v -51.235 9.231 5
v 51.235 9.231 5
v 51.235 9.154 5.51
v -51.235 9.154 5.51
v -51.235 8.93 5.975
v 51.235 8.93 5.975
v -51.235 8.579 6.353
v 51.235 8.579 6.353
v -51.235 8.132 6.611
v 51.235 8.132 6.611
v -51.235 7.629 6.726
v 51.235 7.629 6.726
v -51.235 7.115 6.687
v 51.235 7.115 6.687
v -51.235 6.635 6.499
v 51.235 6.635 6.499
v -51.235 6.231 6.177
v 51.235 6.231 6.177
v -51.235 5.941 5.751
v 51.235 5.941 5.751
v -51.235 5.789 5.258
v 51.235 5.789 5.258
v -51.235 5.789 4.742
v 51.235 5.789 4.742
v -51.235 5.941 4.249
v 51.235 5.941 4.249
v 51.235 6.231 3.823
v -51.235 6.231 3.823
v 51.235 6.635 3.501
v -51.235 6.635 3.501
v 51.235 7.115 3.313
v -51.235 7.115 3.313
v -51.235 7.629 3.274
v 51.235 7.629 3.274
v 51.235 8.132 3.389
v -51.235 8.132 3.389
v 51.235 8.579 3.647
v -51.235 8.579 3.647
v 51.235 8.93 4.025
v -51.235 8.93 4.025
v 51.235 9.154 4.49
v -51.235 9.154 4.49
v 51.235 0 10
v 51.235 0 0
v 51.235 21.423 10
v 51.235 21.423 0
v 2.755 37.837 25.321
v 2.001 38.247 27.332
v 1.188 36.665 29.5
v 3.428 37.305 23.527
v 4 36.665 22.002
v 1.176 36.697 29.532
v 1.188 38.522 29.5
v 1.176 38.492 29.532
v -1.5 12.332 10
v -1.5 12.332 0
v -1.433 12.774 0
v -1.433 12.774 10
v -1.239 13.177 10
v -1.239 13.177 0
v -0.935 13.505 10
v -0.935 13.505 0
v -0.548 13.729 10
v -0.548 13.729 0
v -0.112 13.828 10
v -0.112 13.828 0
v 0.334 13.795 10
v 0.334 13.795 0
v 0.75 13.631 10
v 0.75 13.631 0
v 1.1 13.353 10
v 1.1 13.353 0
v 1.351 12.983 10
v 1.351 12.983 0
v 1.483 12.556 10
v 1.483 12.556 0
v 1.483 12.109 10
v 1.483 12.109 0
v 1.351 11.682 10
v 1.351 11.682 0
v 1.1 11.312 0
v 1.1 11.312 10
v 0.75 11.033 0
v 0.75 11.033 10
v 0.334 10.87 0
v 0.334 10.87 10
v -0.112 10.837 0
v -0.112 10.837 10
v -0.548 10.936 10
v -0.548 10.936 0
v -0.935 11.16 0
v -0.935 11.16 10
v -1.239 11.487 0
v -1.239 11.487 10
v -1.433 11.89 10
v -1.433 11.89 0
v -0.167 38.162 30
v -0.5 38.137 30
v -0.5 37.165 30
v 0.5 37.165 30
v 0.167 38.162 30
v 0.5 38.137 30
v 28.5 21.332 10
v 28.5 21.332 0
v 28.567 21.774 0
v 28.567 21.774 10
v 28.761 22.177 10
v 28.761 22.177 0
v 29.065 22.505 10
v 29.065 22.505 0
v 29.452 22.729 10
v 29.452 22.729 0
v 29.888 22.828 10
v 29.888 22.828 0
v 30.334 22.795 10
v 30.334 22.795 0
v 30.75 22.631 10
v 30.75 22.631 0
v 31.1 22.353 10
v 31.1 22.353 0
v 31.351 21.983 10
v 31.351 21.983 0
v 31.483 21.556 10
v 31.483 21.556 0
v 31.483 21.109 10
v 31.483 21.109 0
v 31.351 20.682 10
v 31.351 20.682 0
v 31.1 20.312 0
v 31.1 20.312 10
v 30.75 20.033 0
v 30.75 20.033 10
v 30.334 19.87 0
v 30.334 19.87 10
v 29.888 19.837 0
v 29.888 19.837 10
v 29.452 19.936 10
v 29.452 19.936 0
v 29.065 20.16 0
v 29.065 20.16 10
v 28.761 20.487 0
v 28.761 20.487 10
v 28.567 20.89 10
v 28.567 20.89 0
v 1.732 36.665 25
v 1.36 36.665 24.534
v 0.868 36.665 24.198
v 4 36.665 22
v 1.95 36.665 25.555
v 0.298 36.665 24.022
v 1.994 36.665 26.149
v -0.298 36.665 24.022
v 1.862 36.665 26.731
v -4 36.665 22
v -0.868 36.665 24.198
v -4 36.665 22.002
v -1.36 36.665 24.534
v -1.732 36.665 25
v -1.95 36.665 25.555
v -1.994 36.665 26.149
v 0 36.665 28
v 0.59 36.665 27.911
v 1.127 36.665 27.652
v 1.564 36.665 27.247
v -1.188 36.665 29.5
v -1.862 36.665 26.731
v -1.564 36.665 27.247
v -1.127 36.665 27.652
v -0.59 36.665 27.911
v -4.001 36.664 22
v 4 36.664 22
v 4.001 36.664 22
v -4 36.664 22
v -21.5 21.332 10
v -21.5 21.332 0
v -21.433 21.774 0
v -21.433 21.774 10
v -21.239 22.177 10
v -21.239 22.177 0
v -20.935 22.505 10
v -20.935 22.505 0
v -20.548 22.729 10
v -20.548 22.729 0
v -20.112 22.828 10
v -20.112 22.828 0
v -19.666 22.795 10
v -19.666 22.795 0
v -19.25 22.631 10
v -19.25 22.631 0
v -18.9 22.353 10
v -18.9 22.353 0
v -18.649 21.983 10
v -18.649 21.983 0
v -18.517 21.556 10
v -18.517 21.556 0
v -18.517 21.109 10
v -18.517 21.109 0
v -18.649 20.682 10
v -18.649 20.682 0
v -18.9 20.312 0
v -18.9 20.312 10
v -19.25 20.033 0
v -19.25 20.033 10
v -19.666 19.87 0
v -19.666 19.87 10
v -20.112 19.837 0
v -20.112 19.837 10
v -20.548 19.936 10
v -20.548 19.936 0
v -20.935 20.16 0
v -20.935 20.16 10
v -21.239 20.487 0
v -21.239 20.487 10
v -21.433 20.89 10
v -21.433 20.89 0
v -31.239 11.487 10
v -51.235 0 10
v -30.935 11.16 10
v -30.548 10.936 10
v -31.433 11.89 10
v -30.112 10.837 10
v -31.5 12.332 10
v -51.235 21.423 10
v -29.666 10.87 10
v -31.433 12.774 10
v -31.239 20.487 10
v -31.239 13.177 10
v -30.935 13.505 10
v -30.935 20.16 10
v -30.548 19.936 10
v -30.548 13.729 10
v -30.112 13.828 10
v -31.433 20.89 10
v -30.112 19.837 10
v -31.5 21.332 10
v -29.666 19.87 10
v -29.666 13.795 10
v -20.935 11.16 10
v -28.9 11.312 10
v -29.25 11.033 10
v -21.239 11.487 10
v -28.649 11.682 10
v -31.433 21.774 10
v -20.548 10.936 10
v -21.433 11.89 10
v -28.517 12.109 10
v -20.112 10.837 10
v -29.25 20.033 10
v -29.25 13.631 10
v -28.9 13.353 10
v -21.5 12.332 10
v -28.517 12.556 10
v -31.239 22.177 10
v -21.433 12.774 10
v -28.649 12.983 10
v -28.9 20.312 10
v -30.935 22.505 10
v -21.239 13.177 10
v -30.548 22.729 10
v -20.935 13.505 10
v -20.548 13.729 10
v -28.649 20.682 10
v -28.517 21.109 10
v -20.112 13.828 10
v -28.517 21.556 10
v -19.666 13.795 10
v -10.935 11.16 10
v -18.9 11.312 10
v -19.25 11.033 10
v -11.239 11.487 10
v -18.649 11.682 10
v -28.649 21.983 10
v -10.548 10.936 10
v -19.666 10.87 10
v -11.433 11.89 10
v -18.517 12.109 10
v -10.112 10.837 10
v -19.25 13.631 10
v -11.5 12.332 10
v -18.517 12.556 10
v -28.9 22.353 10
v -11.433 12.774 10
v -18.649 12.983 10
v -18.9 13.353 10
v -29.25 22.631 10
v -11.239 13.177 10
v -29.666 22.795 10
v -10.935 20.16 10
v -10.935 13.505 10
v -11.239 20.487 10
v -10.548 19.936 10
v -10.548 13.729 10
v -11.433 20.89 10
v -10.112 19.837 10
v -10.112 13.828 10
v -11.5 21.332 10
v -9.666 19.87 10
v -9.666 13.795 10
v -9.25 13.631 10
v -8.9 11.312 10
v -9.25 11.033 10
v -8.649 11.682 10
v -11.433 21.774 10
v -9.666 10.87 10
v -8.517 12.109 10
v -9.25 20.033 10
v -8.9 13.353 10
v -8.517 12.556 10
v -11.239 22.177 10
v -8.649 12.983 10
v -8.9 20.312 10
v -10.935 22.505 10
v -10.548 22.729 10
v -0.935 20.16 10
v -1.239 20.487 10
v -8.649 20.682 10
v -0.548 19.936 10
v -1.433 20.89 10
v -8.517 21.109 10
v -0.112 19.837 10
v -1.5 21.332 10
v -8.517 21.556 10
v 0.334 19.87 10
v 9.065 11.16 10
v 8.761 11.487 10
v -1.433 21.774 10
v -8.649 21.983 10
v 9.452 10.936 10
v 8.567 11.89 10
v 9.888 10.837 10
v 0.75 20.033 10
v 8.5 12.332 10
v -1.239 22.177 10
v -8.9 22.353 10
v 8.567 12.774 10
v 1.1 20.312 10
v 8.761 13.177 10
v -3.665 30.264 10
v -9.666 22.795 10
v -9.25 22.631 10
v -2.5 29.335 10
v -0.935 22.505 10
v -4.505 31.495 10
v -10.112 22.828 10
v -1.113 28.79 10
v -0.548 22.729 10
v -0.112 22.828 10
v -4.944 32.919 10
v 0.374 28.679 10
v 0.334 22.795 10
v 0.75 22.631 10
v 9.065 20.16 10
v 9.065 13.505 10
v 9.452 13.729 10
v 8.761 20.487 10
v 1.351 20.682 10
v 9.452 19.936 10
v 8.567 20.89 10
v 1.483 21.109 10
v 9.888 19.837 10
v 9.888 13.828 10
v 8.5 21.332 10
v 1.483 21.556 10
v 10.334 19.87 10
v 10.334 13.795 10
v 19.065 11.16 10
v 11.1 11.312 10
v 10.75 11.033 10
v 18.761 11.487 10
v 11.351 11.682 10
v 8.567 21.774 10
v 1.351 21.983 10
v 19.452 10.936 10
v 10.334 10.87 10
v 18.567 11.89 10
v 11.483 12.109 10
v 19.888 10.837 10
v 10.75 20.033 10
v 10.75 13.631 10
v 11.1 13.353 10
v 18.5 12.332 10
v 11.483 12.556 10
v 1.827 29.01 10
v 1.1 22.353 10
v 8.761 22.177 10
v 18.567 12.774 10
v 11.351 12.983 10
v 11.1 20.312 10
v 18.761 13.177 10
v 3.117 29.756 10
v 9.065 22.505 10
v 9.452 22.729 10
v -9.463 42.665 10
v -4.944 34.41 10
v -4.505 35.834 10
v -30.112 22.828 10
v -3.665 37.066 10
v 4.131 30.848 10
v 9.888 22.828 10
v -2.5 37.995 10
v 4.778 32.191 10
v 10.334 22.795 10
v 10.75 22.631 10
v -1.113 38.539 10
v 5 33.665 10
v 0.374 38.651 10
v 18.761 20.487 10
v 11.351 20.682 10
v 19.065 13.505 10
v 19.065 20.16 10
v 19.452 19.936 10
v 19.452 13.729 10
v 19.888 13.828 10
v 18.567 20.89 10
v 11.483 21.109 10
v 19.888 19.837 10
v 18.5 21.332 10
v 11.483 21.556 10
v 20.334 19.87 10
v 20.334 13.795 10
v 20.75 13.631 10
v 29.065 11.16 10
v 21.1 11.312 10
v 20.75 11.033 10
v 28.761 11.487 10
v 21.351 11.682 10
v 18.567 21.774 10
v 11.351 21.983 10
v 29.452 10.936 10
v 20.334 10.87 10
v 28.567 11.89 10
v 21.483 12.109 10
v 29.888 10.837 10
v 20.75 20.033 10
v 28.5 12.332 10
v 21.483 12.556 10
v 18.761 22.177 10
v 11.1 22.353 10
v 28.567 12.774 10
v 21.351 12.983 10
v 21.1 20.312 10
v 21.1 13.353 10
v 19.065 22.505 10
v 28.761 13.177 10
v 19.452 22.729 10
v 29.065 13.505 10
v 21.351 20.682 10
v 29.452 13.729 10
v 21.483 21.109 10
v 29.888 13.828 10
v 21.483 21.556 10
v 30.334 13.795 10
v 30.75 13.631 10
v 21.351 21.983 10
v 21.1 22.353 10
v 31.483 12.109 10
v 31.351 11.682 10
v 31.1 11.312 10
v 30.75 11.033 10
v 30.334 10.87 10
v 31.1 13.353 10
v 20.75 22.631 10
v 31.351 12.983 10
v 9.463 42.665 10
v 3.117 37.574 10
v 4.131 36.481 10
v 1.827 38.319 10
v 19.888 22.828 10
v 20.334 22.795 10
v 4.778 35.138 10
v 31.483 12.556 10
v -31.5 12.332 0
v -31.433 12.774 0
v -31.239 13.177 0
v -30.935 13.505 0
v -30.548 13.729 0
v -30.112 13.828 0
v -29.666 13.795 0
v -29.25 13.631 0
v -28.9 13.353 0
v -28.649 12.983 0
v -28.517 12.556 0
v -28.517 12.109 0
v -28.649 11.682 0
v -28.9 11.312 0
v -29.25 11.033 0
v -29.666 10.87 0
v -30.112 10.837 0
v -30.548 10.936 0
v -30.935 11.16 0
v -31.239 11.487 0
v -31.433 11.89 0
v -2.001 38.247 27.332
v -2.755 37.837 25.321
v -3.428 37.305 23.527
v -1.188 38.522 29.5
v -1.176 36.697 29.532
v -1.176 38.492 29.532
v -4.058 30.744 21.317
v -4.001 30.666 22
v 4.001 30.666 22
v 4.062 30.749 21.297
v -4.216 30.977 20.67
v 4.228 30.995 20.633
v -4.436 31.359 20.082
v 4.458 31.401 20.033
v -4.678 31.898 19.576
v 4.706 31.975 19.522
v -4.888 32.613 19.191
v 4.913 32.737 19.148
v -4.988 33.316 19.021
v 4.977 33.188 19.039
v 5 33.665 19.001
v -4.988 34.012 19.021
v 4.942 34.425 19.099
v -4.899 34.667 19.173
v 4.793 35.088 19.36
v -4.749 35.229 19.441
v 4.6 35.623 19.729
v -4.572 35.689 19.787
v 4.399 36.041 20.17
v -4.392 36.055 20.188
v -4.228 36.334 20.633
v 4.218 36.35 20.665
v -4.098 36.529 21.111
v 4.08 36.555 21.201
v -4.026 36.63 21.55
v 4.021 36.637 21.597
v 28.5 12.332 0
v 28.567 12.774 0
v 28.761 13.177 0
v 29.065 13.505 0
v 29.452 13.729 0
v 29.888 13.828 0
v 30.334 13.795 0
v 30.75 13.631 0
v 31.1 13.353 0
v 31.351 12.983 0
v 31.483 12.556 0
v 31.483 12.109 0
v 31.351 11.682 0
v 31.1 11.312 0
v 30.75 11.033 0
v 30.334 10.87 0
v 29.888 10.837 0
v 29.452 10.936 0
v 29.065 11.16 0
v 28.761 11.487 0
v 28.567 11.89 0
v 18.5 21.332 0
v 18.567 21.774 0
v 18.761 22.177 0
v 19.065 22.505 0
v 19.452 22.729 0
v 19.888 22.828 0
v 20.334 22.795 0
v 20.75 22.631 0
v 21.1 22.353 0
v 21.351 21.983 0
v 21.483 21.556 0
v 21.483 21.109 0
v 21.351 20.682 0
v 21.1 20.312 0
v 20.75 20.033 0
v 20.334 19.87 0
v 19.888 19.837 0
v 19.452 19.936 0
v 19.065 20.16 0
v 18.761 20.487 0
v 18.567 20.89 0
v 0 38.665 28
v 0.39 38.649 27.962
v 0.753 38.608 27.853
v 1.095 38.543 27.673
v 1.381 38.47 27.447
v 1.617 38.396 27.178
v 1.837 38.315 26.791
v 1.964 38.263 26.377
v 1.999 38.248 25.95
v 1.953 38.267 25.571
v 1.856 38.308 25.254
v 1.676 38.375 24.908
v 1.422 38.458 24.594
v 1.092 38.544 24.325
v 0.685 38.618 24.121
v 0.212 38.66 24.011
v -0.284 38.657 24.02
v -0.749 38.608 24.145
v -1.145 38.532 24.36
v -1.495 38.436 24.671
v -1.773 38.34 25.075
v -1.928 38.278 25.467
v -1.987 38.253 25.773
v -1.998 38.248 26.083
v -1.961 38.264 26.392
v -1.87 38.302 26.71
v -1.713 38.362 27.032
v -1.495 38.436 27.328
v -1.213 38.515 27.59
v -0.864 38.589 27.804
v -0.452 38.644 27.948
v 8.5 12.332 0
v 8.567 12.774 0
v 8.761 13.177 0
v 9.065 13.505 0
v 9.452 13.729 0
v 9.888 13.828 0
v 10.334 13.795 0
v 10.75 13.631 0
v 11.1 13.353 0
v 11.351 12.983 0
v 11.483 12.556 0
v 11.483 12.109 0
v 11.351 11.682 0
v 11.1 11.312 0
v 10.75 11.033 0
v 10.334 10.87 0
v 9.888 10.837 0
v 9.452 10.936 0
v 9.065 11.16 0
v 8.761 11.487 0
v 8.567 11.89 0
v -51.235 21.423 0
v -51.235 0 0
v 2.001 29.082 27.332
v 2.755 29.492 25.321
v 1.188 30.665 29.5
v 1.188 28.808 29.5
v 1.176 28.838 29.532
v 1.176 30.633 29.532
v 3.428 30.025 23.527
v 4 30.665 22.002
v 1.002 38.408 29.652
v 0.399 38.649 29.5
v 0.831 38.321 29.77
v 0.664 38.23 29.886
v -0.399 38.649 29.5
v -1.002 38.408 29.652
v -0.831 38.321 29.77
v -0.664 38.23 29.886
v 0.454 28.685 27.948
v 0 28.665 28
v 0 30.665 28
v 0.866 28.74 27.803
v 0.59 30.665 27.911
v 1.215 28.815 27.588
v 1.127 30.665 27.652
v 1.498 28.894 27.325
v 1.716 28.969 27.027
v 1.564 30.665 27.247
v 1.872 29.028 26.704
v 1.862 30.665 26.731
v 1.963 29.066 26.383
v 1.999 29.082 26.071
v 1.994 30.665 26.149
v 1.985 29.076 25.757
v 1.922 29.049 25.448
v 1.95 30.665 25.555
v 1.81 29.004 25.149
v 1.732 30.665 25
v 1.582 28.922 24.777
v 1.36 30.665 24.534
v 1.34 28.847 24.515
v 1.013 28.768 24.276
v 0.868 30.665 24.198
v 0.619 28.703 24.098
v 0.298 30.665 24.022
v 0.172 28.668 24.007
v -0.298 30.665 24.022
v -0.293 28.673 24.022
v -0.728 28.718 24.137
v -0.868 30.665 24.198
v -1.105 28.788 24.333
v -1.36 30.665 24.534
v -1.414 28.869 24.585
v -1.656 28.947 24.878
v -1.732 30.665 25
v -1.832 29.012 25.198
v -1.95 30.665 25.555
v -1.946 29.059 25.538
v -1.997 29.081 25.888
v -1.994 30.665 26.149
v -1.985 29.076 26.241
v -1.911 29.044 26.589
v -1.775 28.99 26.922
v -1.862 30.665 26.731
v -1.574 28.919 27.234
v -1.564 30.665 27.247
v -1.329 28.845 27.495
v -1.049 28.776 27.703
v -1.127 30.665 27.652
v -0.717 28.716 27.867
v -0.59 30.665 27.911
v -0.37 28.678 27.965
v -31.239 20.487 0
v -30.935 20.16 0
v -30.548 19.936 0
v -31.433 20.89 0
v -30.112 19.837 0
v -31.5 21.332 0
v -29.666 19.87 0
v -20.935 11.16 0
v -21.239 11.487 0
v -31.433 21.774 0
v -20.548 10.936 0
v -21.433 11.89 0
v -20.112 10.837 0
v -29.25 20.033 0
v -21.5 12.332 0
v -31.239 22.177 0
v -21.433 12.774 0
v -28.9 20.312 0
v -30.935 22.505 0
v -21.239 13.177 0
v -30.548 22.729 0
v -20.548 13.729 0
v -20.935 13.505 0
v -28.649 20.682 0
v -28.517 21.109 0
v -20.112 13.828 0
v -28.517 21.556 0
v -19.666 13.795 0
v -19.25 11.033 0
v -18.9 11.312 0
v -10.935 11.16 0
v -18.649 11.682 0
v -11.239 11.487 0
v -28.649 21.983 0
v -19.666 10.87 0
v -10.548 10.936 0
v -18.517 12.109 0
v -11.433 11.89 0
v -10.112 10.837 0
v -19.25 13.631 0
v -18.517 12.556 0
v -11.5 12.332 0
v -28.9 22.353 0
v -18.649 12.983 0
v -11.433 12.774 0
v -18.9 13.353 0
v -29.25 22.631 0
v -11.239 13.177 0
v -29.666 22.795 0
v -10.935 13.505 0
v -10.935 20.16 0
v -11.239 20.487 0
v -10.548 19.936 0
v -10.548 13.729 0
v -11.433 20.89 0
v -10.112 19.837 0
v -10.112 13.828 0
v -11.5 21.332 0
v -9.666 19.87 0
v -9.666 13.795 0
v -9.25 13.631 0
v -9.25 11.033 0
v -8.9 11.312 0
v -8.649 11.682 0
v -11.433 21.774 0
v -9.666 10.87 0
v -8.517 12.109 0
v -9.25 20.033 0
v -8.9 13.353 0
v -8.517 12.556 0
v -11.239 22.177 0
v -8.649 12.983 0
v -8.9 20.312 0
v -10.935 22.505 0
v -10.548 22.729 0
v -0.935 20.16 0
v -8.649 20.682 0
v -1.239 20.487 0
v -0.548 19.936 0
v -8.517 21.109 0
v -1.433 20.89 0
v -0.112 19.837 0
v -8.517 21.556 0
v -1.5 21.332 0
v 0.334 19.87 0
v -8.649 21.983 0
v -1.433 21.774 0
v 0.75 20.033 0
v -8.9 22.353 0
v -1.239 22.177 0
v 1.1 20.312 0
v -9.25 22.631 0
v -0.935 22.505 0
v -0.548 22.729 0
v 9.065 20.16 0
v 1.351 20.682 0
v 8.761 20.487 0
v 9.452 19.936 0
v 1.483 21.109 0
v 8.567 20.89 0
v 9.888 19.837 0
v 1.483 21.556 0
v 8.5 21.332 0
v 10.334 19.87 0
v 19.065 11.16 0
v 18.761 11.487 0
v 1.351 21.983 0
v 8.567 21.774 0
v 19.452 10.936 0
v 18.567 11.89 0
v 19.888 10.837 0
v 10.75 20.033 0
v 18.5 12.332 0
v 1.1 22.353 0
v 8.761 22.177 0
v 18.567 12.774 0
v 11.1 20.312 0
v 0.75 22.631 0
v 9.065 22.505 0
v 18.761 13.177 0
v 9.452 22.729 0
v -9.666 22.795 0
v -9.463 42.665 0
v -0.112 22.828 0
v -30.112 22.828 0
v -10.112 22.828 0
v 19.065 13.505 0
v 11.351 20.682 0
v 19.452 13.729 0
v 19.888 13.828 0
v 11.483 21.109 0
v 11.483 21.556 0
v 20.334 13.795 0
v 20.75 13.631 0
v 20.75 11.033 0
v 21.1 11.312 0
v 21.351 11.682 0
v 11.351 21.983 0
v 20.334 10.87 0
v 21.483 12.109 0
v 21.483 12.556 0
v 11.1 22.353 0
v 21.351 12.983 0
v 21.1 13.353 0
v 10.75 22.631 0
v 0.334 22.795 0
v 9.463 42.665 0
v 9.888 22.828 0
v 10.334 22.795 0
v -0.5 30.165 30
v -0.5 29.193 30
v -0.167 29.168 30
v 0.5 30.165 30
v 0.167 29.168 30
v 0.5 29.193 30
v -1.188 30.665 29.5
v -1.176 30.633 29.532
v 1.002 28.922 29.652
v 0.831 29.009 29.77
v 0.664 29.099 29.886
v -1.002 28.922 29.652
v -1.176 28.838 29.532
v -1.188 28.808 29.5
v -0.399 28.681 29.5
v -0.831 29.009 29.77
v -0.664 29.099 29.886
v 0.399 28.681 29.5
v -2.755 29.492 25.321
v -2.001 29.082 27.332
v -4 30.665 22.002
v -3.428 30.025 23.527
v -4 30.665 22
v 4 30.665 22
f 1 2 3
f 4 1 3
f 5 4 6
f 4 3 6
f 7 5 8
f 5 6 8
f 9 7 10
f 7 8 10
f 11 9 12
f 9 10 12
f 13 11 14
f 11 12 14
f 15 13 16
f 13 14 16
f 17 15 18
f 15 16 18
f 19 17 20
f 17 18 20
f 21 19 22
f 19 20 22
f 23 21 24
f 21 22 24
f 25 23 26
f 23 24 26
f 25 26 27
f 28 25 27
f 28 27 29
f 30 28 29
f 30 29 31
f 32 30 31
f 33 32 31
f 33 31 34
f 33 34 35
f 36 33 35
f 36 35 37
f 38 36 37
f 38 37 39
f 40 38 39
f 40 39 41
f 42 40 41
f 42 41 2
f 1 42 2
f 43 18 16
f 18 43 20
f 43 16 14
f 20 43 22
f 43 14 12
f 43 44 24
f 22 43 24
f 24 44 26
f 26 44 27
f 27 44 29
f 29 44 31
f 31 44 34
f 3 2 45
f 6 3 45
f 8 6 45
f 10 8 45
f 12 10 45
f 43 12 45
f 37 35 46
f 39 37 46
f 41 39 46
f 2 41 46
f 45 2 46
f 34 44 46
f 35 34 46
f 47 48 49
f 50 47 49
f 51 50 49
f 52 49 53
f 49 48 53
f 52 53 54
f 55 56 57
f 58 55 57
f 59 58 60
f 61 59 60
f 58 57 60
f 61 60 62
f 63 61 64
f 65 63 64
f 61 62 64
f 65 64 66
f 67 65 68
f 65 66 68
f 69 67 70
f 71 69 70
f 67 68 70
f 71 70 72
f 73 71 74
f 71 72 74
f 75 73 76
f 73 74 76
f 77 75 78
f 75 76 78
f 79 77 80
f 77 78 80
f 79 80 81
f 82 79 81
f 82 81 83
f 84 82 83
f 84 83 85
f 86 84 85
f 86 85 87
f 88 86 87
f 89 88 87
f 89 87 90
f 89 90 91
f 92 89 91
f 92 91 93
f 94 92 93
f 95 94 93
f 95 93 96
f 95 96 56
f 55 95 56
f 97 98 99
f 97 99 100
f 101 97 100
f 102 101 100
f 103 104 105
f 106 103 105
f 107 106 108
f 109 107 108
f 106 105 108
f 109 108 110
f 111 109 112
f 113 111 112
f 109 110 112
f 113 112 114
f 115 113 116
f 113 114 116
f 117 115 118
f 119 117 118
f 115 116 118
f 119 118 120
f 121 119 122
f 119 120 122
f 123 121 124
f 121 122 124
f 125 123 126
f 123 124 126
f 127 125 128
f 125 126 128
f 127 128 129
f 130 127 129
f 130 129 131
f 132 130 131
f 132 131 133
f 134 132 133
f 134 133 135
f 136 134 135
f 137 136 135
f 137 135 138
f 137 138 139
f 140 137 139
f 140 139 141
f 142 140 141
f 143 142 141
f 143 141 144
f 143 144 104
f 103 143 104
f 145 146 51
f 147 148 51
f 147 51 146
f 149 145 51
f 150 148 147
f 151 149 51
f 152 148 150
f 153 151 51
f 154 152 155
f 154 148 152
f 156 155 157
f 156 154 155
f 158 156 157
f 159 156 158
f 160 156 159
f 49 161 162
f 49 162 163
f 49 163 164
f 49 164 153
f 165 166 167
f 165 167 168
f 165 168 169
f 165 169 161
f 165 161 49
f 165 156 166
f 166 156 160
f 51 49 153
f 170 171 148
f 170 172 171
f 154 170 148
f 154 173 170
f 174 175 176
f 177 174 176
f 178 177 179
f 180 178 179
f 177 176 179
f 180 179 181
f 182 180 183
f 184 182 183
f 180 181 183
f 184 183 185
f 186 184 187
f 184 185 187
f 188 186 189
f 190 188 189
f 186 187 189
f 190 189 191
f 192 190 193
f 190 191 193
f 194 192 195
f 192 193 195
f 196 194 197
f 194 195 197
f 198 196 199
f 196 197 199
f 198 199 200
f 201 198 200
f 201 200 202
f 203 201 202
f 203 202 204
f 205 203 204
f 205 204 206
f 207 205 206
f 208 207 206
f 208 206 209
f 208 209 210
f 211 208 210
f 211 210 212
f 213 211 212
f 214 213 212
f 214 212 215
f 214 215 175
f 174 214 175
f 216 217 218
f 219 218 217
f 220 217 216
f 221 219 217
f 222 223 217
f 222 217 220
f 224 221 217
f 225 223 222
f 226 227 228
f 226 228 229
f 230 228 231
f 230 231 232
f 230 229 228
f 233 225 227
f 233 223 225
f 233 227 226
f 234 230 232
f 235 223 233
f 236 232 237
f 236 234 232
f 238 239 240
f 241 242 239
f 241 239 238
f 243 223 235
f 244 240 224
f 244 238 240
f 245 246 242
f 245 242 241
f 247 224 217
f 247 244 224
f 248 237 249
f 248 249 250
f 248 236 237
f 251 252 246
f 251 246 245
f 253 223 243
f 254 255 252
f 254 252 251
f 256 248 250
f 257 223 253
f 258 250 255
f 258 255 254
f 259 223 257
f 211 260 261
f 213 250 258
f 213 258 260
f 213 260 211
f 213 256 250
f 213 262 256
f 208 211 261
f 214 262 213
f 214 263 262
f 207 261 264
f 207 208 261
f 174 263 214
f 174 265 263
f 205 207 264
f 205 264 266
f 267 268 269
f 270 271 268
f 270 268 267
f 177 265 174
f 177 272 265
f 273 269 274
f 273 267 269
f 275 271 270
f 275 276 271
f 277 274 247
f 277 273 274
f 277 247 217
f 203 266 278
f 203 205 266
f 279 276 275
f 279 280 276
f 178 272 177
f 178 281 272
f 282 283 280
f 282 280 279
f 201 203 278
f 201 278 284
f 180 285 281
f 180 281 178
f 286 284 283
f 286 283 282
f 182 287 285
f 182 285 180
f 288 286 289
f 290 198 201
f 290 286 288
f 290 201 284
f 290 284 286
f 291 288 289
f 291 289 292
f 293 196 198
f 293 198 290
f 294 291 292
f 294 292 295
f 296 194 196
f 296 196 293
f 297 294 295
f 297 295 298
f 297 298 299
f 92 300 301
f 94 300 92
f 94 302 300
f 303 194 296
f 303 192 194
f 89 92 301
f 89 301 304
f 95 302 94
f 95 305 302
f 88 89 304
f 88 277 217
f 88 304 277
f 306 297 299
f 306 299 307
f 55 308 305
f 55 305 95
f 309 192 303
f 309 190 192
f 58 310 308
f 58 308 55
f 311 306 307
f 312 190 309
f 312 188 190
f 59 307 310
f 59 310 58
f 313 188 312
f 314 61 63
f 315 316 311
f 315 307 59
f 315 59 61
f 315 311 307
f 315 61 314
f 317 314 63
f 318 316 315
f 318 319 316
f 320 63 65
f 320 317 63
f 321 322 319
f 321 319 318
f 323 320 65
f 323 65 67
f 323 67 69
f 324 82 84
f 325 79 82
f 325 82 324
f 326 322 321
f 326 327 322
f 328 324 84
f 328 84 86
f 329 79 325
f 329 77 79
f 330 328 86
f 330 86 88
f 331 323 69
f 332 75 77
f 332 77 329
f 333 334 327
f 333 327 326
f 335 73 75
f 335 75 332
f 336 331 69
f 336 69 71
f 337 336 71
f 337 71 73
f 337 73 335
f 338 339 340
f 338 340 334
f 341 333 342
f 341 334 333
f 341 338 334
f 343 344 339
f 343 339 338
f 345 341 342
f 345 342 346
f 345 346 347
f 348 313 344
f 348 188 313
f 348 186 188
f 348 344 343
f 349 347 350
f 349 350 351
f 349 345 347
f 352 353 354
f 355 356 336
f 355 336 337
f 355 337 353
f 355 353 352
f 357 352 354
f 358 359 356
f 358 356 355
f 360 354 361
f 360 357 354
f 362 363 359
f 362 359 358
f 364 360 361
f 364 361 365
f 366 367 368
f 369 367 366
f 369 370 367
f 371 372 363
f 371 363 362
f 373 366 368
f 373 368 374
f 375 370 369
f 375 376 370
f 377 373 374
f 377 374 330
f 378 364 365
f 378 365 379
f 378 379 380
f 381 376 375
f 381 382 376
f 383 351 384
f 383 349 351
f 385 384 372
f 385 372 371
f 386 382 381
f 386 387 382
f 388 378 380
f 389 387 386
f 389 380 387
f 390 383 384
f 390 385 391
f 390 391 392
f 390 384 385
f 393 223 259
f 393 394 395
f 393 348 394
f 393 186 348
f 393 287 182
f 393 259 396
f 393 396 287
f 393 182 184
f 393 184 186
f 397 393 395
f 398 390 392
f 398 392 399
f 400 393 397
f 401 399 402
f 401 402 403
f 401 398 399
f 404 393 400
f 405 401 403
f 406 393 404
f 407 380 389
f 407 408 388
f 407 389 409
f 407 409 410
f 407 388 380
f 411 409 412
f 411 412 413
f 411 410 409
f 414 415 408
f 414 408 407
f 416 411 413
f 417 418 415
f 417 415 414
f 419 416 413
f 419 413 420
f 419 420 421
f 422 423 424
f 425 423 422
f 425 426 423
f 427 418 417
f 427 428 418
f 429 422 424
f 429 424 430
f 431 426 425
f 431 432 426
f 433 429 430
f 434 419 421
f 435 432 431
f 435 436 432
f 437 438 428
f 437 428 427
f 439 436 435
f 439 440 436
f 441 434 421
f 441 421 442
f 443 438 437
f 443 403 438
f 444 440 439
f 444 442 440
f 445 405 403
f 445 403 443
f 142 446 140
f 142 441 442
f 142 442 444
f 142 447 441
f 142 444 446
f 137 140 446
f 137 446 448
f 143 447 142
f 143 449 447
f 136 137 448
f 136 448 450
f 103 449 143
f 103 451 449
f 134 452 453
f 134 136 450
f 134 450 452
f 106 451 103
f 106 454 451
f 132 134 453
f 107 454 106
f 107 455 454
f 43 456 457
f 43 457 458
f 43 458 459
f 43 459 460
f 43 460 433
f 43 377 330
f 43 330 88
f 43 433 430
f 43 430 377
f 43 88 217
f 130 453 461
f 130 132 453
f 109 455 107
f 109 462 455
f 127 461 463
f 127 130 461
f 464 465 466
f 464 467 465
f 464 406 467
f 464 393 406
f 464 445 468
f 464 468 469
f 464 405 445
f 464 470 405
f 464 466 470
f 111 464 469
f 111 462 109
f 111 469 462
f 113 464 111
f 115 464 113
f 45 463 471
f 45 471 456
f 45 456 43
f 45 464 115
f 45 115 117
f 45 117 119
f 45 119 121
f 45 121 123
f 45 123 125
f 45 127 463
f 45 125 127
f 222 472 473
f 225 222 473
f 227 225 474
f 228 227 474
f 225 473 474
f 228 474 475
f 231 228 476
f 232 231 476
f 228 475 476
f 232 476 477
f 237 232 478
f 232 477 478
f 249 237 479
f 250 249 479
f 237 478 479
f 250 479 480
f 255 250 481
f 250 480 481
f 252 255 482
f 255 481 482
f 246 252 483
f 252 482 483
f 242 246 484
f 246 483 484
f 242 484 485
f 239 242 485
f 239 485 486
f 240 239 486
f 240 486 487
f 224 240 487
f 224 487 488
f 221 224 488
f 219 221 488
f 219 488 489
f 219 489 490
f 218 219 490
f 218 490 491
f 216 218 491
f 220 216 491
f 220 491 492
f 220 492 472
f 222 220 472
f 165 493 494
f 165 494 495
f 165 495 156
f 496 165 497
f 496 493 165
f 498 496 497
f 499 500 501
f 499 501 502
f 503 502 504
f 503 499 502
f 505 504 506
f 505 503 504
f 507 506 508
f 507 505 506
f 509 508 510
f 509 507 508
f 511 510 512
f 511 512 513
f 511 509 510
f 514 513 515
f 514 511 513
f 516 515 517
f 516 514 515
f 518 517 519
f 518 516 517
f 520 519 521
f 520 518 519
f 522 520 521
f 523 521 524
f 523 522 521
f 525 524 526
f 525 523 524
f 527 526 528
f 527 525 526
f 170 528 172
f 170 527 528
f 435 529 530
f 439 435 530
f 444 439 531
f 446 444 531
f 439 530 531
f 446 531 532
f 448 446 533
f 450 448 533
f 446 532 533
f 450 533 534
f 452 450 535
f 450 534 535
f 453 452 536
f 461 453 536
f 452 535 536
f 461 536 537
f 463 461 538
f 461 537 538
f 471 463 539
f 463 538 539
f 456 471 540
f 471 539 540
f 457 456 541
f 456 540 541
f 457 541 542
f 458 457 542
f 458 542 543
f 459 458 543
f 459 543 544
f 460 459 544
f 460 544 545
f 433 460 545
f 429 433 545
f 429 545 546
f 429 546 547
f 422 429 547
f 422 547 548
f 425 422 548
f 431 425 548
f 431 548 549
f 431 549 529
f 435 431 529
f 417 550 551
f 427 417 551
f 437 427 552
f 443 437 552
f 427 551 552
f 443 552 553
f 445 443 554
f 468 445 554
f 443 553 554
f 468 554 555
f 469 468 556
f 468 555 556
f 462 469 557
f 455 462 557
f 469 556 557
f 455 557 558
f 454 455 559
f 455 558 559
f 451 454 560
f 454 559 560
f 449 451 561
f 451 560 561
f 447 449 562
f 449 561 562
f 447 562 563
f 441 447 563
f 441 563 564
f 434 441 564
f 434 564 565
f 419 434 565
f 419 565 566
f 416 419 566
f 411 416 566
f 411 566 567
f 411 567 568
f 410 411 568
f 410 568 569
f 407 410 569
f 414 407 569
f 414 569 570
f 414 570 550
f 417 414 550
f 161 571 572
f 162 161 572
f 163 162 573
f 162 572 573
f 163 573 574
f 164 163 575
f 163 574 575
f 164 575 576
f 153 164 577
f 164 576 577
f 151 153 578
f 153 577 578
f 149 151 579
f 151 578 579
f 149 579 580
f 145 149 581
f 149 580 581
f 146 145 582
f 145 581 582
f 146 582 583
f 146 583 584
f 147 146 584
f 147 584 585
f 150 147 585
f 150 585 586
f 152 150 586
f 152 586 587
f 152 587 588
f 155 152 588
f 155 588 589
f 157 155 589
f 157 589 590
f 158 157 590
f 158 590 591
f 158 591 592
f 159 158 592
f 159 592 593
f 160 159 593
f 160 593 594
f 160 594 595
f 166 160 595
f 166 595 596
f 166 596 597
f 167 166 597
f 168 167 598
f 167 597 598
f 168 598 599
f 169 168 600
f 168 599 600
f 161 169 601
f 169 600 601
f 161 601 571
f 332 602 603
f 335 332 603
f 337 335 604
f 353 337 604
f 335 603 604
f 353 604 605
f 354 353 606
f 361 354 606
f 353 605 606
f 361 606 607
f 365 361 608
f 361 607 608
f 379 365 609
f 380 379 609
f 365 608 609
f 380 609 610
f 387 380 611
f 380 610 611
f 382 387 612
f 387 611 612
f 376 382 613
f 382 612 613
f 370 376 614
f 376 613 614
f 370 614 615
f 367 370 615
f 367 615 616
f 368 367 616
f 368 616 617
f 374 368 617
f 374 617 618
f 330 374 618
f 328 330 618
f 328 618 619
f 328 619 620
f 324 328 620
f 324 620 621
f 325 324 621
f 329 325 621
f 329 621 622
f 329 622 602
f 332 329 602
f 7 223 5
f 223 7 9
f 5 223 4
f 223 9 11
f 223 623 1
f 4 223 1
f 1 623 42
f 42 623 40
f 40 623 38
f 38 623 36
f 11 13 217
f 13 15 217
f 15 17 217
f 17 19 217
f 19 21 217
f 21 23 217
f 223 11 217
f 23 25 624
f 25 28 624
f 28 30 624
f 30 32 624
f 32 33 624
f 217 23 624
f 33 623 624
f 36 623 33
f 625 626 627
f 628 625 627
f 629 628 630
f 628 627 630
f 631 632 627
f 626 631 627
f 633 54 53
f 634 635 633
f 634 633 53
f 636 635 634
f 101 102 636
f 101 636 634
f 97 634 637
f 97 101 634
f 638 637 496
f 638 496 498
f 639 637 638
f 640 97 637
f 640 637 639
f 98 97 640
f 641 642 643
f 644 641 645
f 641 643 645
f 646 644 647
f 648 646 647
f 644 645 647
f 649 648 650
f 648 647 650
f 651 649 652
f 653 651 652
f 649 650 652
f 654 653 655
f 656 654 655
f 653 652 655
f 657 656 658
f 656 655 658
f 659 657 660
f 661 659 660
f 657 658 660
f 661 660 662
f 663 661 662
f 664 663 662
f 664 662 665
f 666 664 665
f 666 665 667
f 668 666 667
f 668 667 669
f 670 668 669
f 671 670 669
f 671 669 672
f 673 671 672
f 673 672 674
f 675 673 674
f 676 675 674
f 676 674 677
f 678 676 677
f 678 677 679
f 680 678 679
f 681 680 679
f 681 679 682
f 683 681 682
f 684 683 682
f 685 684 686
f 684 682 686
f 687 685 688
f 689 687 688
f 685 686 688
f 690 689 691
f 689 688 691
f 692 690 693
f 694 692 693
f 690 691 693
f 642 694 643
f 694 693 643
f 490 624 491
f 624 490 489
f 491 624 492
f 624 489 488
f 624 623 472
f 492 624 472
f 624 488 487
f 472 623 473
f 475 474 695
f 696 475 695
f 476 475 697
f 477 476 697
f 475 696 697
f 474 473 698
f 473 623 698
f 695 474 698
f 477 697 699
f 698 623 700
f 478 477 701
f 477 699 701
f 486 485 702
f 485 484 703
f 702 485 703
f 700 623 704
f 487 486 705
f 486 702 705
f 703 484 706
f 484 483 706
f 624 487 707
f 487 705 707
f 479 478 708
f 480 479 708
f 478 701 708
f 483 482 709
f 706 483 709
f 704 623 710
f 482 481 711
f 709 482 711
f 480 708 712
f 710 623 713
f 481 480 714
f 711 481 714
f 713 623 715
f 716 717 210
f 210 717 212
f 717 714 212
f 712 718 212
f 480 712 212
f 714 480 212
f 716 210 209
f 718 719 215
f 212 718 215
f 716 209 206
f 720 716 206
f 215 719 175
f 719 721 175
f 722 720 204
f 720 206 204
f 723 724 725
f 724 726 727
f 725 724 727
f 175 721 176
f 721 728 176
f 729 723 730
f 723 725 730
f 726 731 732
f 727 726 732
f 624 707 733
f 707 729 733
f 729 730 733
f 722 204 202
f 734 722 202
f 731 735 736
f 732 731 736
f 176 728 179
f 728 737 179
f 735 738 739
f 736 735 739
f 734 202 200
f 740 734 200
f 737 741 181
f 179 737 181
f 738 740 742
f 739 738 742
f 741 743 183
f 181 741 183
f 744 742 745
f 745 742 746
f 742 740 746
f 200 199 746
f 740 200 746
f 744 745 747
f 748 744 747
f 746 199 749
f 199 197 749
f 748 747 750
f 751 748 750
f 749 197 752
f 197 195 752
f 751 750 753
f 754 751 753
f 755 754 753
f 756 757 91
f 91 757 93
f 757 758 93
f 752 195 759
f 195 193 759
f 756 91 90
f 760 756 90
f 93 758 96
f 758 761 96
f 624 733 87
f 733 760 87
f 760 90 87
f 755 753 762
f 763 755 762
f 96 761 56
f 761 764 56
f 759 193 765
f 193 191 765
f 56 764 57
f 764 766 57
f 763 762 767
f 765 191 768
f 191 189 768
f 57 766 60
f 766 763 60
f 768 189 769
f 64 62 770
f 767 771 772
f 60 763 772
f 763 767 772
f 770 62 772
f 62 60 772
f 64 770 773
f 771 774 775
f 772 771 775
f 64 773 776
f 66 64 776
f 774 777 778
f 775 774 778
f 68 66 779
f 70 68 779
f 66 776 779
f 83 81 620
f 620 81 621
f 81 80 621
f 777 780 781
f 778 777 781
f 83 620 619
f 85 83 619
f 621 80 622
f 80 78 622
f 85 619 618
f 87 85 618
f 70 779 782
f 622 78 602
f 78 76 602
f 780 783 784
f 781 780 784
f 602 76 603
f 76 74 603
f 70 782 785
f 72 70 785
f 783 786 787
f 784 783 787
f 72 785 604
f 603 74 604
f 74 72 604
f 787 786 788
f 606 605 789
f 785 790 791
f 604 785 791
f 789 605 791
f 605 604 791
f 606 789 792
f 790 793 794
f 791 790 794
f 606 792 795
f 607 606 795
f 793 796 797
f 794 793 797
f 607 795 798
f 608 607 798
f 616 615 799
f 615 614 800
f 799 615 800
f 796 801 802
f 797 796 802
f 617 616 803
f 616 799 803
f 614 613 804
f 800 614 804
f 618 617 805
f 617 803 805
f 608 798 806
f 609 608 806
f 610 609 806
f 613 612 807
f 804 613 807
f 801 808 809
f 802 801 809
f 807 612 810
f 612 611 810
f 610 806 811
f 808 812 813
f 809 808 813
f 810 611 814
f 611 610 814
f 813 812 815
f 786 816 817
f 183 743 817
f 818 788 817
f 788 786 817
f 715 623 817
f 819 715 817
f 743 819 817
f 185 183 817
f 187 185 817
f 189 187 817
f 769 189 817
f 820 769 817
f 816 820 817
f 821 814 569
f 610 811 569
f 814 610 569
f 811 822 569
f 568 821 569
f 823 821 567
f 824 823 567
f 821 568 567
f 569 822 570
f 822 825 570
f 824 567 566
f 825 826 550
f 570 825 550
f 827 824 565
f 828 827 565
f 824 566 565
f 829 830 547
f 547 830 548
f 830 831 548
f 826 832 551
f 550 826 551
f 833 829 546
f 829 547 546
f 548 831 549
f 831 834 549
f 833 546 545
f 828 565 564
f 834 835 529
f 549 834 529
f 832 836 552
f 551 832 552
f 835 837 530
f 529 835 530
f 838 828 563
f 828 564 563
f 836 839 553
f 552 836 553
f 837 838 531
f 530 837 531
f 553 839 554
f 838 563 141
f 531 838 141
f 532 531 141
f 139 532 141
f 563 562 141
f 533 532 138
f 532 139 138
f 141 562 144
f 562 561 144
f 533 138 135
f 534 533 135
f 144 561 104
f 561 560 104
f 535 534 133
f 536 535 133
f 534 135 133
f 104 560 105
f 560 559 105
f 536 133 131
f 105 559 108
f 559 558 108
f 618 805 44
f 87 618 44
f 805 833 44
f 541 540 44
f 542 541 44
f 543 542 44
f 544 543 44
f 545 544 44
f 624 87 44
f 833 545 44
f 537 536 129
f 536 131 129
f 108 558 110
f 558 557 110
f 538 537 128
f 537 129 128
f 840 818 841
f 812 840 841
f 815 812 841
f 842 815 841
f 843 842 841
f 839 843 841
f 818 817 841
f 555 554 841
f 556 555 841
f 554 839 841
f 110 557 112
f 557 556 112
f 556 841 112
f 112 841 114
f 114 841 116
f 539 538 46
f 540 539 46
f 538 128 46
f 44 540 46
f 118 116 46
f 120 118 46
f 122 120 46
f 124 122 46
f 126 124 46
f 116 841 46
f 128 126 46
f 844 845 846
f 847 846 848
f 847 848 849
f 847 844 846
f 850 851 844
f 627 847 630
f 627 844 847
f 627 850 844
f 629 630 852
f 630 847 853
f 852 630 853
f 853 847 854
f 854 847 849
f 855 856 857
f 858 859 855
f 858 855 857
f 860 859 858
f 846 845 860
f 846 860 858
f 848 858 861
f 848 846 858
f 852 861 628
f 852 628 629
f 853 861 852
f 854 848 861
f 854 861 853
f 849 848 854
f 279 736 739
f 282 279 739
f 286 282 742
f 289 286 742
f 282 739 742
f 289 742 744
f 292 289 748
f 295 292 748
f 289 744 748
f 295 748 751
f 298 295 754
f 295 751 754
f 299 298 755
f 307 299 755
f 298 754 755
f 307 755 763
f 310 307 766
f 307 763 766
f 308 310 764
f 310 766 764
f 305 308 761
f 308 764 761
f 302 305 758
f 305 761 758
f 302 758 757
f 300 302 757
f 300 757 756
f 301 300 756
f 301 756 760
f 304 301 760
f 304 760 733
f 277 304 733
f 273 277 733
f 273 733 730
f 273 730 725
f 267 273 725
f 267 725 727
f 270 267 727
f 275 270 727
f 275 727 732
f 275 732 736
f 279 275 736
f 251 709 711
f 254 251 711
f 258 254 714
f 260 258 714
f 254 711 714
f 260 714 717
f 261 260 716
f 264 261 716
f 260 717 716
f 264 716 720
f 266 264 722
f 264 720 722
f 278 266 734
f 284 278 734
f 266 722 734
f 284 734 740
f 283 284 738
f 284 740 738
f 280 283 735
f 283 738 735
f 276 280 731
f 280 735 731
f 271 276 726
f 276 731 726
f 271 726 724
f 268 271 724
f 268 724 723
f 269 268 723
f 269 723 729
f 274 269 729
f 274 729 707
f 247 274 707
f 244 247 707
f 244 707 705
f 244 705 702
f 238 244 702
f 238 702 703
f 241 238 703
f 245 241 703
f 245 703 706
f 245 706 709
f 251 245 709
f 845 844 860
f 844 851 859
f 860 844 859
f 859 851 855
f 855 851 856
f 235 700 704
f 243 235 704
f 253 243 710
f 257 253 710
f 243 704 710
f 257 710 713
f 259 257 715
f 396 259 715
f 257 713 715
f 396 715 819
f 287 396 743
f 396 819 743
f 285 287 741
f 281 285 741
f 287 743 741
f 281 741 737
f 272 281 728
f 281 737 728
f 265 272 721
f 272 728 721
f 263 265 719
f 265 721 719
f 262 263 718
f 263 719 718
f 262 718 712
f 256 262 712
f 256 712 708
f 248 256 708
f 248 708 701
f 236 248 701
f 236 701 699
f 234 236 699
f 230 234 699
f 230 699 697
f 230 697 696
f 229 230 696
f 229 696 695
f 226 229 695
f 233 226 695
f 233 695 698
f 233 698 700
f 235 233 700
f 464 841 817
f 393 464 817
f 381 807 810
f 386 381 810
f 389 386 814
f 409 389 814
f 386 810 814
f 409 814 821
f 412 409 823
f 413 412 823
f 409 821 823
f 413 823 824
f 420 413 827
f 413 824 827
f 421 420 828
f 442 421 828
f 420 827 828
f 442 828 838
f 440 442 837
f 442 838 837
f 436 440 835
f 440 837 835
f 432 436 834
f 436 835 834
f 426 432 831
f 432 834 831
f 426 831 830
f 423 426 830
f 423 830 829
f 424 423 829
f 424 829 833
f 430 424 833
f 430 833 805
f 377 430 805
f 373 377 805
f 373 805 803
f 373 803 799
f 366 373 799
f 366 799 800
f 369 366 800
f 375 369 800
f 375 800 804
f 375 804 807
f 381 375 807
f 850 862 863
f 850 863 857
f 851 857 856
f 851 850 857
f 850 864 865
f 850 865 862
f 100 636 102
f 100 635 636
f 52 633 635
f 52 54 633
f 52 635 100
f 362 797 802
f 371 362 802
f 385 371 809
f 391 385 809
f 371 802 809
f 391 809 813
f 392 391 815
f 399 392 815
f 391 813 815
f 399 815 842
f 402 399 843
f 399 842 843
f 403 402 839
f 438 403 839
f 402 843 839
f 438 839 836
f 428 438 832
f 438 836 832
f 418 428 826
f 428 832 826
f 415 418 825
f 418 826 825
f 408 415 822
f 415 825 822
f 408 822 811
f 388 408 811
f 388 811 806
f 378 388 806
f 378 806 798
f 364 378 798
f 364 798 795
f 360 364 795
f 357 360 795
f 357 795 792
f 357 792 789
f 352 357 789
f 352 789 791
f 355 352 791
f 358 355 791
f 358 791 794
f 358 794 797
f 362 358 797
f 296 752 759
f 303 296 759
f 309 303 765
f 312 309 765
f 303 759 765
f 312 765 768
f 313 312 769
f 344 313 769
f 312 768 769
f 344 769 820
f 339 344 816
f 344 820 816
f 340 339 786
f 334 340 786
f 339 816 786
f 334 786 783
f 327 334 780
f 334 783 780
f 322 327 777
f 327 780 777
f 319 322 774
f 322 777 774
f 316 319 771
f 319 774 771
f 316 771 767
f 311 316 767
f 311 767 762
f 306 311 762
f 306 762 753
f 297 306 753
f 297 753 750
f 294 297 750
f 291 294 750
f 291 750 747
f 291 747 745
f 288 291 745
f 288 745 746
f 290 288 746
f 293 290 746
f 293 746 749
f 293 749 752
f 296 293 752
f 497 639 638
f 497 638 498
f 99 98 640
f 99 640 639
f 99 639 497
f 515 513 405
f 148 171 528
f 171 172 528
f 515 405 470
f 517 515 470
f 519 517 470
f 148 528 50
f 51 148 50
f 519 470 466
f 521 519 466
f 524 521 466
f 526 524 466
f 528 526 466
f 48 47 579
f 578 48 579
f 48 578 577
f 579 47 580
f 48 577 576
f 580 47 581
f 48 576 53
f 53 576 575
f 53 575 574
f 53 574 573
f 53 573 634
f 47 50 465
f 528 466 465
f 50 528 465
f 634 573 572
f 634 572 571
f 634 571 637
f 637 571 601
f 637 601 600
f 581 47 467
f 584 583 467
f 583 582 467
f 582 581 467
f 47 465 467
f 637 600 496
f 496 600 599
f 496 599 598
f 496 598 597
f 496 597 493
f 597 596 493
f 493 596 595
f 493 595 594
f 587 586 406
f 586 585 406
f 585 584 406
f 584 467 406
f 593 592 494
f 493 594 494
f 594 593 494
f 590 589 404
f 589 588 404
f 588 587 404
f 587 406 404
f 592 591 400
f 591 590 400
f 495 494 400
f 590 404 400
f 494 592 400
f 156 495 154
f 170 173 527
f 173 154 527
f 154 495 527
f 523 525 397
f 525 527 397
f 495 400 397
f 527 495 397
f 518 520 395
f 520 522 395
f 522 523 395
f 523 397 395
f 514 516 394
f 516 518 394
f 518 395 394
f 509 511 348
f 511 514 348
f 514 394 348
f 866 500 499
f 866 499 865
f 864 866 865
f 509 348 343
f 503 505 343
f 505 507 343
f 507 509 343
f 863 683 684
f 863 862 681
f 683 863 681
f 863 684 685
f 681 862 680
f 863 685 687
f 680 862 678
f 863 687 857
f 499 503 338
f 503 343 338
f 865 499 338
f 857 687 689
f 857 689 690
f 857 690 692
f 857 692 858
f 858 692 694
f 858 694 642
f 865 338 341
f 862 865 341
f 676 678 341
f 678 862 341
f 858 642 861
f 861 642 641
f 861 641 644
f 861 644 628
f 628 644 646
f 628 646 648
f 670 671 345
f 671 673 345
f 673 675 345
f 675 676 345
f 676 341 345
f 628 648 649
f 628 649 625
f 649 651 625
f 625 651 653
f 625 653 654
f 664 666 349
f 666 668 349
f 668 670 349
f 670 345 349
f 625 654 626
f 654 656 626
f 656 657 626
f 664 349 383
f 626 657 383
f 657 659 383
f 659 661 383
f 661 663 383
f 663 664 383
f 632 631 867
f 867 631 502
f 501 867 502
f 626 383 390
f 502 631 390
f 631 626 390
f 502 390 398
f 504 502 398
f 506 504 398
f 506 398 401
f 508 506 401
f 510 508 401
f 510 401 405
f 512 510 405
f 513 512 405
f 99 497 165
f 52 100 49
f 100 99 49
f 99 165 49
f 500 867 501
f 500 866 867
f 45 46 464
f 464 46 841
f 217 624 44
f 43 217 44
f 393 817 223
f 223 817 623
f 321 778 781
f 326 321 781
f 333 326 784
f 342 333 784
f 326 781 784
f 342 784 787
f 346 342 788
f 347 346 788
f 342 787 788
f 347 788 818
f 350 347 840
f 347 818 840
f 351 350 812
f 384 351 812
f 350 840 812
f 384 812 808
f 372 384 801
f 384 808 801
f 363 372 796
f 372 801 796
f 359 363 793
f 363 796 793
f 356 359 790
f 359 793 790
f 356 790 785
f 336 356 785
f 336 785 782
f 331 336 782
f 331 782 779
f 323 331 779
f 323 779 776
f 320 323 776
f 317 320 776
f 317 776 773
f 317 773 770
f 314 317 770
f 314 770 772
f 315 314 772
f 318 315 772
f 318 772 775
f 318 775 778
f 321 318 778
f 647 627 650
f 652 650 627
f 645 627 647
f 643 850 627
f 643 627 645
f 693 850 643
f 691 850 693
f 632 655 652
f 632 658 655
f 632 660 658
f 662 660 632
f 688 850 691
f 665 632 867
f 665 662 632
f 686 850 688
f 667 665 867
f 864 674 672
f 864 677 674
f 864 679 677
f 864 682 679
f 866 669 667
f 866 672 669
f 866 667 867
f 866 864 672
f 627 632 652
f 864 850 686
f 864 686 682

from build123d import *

# Parameters (mm, degrees)
BOSS_EXTRUDE1_DEPTH = 10
SKETCH10_R          = 1.5
CUT_EXTRUDE9_DEPTH  = 20
SKETCH11_R          = 1.730599661
CUT_EXTRUDE10_DEPTH = 112.446287057
SKETCH12_R          = 5
BOSS_EXTRUDE4_DEPTH = 20
CUT_EXTRUDE11_START = -10.000002096
CUT_EXTRUDE11_DEPTH = 10.000002096
SKETCH14_R          = 2
CUT_EXTRUDE12_DEPTH = 71.851658179
CHAMFER1_SIZE       = 0.5


# Read off the part's stored shape, not the designer's step: Cut-Extrude11
with BuildPart() as part:
    # Sketch1 → Boss-Extrude1 (new body)
    with BuildSketch(Plane.XY):
        Polygon((51.23475383, 0), (51.23475383, 21.423100566), (9.462915873, 42.664679757), (-9.462915873, 42.664679757), (-51.23475383, 21.423100566), (-51.23475383, 0), align=None)
    extrude(amount=BOSS_EXTRUDE1_DEPTH)

    # Sketch10 → Cut-Extrude9 (cut)
    with BuildSketch(Plane(origin=(0, 0, 0), x_dir=(-1, 0, 0), z_dir=(0, 0, -1))):
        with Locations((0, 21.332339879)):
            Circle(SKETCH10_R)
        with Locations((10, 21.332339879)):
            Circle(SKETCH10_R)
        with Locations((20, 21.332339879)):
            Circle(SKETCH10_R)
        with Locations((30, 21.332339879)):
            Circle(SKETCH10_R)
        with Locations((-10, 21.332339879)):
            Circle(SKETCH10_R)
        with Locations((-20, 21.332339879)):
            Circle(SKETCH10_R)
        with Locations((-30, 21.332339879)):
            Circle(SKETCH10_R)
        with Locations((10, 12.332339879)):
            Circle(SKETCH10_R)
        with Locations((0, 12.332339879)):
            Circle(SKETCH10_R)
        with Locations((20, 12.332339879)):
            Circle(SKETCH10_R)
        with Locations((30, 12.332339879)):
            Circle(SKETCH10_R)
        with Locations((-10, 12.332339879)):
            Circle(SKETCH10_R)
        with Locations((-20, 12.332339879)):
            Circle(SKETCH10_R)
        with Locations((-30, 12.332339879)):
            Circle(SKETCH10_R)
    extrude(amount=-CUT_EXTRUDE9_DEPTH, mode=Mode.SUBTRACT)

    # Sketch11 → Cut-Extrude10 (cut, through all)
    with BuildSketch(Plane(origin=(51.23475383, 0, 0), x_dir=(0, 0, -1), z_dir=(1, 0, 0))):
        with Locations(Location((-5, 7.5, 0), (0, 0, 90))):
            Circle(SKETCH11_R)
    extrude(amount=-CUT_EXTRUDE10_DEPTH, mode=Mode.SUBTRACT)

    # Sketch12 → Boss-Extrude4 (add)
    with BuildSketch(Plane.XY.offset(10)):
        with Locations((0, 33.664679757)):
            Circle(SKETCH12_R)
    extrude(amount=BOSS_EXTRUDE4_DEPTH)

    # Cut-Extrude11 outline → Cut-Extrude11 (cut)
    with BuildSketch(Plane(origin=(5, 0, 0), x_dir=(0, 0, -1), z_dir=(1, 0, 0)).offset(CUT_EXTRUDE11_START)):
        with BuildLine():
            ThreePointArc((-22, 30.665551075), (-19.000871318, 33.664679757), (-22, 36.663808439))
            Line((-22, 36.663808439), (-22, 36.664679757))
            Line((-22, 36.664679757), (-30, 36.664679757))
            Line((-30, 36.664679757), (-30, 30.664679757))
            Line((-30, 30.664679757), (-22, 30.664679757))
            Line((-22, 30.664679757), (-22, 30.665551075))
        make_face()
    extrude(amount=CUT_EXTRUDE11_DEPTH, mode=Mode.SUBTRACT)

    # Sketch14 → Cut-Extrude12 (cut, through all)
    with BuildSketch(Plane(origin=(0, 38.664679757, 0), x_dir=(1, 0, 0), z_dir=(0, 1, 0))):
        with Locations(Location((0, -26, 0), (0, 0, 270))):
            Circle(SKETCH14_R)
        Polygon((-4.00065334, -22), (-1, -30), (-4, -30), align=None)
        Polygon((1, -30), (4, -30), (4.00065334, -22), align=None)
    extrude(amount=-CUT_EXTRUDE12_DEPTH, mode=Mode.SUBTRACT)

    # Chamfer1
    chamfer1_edges = [part.edges().sort_by_distance(p)[0] for p in [
        (1, 29.715190014, 30),
        (1, 37.6141695, 30),
        (0, 36.664679757, 30),
        (0, 28.664679757, 30),
        (0, 38.664679757, 30),
        (0, 30.664679757, 30),
        (-1, 29.715190014, 30),
        (-1, 37.6141695, 30),
    ]]
    chamfer(chamfer1_edges, length=CHAMFER1_SIZE)


solid = part.part
